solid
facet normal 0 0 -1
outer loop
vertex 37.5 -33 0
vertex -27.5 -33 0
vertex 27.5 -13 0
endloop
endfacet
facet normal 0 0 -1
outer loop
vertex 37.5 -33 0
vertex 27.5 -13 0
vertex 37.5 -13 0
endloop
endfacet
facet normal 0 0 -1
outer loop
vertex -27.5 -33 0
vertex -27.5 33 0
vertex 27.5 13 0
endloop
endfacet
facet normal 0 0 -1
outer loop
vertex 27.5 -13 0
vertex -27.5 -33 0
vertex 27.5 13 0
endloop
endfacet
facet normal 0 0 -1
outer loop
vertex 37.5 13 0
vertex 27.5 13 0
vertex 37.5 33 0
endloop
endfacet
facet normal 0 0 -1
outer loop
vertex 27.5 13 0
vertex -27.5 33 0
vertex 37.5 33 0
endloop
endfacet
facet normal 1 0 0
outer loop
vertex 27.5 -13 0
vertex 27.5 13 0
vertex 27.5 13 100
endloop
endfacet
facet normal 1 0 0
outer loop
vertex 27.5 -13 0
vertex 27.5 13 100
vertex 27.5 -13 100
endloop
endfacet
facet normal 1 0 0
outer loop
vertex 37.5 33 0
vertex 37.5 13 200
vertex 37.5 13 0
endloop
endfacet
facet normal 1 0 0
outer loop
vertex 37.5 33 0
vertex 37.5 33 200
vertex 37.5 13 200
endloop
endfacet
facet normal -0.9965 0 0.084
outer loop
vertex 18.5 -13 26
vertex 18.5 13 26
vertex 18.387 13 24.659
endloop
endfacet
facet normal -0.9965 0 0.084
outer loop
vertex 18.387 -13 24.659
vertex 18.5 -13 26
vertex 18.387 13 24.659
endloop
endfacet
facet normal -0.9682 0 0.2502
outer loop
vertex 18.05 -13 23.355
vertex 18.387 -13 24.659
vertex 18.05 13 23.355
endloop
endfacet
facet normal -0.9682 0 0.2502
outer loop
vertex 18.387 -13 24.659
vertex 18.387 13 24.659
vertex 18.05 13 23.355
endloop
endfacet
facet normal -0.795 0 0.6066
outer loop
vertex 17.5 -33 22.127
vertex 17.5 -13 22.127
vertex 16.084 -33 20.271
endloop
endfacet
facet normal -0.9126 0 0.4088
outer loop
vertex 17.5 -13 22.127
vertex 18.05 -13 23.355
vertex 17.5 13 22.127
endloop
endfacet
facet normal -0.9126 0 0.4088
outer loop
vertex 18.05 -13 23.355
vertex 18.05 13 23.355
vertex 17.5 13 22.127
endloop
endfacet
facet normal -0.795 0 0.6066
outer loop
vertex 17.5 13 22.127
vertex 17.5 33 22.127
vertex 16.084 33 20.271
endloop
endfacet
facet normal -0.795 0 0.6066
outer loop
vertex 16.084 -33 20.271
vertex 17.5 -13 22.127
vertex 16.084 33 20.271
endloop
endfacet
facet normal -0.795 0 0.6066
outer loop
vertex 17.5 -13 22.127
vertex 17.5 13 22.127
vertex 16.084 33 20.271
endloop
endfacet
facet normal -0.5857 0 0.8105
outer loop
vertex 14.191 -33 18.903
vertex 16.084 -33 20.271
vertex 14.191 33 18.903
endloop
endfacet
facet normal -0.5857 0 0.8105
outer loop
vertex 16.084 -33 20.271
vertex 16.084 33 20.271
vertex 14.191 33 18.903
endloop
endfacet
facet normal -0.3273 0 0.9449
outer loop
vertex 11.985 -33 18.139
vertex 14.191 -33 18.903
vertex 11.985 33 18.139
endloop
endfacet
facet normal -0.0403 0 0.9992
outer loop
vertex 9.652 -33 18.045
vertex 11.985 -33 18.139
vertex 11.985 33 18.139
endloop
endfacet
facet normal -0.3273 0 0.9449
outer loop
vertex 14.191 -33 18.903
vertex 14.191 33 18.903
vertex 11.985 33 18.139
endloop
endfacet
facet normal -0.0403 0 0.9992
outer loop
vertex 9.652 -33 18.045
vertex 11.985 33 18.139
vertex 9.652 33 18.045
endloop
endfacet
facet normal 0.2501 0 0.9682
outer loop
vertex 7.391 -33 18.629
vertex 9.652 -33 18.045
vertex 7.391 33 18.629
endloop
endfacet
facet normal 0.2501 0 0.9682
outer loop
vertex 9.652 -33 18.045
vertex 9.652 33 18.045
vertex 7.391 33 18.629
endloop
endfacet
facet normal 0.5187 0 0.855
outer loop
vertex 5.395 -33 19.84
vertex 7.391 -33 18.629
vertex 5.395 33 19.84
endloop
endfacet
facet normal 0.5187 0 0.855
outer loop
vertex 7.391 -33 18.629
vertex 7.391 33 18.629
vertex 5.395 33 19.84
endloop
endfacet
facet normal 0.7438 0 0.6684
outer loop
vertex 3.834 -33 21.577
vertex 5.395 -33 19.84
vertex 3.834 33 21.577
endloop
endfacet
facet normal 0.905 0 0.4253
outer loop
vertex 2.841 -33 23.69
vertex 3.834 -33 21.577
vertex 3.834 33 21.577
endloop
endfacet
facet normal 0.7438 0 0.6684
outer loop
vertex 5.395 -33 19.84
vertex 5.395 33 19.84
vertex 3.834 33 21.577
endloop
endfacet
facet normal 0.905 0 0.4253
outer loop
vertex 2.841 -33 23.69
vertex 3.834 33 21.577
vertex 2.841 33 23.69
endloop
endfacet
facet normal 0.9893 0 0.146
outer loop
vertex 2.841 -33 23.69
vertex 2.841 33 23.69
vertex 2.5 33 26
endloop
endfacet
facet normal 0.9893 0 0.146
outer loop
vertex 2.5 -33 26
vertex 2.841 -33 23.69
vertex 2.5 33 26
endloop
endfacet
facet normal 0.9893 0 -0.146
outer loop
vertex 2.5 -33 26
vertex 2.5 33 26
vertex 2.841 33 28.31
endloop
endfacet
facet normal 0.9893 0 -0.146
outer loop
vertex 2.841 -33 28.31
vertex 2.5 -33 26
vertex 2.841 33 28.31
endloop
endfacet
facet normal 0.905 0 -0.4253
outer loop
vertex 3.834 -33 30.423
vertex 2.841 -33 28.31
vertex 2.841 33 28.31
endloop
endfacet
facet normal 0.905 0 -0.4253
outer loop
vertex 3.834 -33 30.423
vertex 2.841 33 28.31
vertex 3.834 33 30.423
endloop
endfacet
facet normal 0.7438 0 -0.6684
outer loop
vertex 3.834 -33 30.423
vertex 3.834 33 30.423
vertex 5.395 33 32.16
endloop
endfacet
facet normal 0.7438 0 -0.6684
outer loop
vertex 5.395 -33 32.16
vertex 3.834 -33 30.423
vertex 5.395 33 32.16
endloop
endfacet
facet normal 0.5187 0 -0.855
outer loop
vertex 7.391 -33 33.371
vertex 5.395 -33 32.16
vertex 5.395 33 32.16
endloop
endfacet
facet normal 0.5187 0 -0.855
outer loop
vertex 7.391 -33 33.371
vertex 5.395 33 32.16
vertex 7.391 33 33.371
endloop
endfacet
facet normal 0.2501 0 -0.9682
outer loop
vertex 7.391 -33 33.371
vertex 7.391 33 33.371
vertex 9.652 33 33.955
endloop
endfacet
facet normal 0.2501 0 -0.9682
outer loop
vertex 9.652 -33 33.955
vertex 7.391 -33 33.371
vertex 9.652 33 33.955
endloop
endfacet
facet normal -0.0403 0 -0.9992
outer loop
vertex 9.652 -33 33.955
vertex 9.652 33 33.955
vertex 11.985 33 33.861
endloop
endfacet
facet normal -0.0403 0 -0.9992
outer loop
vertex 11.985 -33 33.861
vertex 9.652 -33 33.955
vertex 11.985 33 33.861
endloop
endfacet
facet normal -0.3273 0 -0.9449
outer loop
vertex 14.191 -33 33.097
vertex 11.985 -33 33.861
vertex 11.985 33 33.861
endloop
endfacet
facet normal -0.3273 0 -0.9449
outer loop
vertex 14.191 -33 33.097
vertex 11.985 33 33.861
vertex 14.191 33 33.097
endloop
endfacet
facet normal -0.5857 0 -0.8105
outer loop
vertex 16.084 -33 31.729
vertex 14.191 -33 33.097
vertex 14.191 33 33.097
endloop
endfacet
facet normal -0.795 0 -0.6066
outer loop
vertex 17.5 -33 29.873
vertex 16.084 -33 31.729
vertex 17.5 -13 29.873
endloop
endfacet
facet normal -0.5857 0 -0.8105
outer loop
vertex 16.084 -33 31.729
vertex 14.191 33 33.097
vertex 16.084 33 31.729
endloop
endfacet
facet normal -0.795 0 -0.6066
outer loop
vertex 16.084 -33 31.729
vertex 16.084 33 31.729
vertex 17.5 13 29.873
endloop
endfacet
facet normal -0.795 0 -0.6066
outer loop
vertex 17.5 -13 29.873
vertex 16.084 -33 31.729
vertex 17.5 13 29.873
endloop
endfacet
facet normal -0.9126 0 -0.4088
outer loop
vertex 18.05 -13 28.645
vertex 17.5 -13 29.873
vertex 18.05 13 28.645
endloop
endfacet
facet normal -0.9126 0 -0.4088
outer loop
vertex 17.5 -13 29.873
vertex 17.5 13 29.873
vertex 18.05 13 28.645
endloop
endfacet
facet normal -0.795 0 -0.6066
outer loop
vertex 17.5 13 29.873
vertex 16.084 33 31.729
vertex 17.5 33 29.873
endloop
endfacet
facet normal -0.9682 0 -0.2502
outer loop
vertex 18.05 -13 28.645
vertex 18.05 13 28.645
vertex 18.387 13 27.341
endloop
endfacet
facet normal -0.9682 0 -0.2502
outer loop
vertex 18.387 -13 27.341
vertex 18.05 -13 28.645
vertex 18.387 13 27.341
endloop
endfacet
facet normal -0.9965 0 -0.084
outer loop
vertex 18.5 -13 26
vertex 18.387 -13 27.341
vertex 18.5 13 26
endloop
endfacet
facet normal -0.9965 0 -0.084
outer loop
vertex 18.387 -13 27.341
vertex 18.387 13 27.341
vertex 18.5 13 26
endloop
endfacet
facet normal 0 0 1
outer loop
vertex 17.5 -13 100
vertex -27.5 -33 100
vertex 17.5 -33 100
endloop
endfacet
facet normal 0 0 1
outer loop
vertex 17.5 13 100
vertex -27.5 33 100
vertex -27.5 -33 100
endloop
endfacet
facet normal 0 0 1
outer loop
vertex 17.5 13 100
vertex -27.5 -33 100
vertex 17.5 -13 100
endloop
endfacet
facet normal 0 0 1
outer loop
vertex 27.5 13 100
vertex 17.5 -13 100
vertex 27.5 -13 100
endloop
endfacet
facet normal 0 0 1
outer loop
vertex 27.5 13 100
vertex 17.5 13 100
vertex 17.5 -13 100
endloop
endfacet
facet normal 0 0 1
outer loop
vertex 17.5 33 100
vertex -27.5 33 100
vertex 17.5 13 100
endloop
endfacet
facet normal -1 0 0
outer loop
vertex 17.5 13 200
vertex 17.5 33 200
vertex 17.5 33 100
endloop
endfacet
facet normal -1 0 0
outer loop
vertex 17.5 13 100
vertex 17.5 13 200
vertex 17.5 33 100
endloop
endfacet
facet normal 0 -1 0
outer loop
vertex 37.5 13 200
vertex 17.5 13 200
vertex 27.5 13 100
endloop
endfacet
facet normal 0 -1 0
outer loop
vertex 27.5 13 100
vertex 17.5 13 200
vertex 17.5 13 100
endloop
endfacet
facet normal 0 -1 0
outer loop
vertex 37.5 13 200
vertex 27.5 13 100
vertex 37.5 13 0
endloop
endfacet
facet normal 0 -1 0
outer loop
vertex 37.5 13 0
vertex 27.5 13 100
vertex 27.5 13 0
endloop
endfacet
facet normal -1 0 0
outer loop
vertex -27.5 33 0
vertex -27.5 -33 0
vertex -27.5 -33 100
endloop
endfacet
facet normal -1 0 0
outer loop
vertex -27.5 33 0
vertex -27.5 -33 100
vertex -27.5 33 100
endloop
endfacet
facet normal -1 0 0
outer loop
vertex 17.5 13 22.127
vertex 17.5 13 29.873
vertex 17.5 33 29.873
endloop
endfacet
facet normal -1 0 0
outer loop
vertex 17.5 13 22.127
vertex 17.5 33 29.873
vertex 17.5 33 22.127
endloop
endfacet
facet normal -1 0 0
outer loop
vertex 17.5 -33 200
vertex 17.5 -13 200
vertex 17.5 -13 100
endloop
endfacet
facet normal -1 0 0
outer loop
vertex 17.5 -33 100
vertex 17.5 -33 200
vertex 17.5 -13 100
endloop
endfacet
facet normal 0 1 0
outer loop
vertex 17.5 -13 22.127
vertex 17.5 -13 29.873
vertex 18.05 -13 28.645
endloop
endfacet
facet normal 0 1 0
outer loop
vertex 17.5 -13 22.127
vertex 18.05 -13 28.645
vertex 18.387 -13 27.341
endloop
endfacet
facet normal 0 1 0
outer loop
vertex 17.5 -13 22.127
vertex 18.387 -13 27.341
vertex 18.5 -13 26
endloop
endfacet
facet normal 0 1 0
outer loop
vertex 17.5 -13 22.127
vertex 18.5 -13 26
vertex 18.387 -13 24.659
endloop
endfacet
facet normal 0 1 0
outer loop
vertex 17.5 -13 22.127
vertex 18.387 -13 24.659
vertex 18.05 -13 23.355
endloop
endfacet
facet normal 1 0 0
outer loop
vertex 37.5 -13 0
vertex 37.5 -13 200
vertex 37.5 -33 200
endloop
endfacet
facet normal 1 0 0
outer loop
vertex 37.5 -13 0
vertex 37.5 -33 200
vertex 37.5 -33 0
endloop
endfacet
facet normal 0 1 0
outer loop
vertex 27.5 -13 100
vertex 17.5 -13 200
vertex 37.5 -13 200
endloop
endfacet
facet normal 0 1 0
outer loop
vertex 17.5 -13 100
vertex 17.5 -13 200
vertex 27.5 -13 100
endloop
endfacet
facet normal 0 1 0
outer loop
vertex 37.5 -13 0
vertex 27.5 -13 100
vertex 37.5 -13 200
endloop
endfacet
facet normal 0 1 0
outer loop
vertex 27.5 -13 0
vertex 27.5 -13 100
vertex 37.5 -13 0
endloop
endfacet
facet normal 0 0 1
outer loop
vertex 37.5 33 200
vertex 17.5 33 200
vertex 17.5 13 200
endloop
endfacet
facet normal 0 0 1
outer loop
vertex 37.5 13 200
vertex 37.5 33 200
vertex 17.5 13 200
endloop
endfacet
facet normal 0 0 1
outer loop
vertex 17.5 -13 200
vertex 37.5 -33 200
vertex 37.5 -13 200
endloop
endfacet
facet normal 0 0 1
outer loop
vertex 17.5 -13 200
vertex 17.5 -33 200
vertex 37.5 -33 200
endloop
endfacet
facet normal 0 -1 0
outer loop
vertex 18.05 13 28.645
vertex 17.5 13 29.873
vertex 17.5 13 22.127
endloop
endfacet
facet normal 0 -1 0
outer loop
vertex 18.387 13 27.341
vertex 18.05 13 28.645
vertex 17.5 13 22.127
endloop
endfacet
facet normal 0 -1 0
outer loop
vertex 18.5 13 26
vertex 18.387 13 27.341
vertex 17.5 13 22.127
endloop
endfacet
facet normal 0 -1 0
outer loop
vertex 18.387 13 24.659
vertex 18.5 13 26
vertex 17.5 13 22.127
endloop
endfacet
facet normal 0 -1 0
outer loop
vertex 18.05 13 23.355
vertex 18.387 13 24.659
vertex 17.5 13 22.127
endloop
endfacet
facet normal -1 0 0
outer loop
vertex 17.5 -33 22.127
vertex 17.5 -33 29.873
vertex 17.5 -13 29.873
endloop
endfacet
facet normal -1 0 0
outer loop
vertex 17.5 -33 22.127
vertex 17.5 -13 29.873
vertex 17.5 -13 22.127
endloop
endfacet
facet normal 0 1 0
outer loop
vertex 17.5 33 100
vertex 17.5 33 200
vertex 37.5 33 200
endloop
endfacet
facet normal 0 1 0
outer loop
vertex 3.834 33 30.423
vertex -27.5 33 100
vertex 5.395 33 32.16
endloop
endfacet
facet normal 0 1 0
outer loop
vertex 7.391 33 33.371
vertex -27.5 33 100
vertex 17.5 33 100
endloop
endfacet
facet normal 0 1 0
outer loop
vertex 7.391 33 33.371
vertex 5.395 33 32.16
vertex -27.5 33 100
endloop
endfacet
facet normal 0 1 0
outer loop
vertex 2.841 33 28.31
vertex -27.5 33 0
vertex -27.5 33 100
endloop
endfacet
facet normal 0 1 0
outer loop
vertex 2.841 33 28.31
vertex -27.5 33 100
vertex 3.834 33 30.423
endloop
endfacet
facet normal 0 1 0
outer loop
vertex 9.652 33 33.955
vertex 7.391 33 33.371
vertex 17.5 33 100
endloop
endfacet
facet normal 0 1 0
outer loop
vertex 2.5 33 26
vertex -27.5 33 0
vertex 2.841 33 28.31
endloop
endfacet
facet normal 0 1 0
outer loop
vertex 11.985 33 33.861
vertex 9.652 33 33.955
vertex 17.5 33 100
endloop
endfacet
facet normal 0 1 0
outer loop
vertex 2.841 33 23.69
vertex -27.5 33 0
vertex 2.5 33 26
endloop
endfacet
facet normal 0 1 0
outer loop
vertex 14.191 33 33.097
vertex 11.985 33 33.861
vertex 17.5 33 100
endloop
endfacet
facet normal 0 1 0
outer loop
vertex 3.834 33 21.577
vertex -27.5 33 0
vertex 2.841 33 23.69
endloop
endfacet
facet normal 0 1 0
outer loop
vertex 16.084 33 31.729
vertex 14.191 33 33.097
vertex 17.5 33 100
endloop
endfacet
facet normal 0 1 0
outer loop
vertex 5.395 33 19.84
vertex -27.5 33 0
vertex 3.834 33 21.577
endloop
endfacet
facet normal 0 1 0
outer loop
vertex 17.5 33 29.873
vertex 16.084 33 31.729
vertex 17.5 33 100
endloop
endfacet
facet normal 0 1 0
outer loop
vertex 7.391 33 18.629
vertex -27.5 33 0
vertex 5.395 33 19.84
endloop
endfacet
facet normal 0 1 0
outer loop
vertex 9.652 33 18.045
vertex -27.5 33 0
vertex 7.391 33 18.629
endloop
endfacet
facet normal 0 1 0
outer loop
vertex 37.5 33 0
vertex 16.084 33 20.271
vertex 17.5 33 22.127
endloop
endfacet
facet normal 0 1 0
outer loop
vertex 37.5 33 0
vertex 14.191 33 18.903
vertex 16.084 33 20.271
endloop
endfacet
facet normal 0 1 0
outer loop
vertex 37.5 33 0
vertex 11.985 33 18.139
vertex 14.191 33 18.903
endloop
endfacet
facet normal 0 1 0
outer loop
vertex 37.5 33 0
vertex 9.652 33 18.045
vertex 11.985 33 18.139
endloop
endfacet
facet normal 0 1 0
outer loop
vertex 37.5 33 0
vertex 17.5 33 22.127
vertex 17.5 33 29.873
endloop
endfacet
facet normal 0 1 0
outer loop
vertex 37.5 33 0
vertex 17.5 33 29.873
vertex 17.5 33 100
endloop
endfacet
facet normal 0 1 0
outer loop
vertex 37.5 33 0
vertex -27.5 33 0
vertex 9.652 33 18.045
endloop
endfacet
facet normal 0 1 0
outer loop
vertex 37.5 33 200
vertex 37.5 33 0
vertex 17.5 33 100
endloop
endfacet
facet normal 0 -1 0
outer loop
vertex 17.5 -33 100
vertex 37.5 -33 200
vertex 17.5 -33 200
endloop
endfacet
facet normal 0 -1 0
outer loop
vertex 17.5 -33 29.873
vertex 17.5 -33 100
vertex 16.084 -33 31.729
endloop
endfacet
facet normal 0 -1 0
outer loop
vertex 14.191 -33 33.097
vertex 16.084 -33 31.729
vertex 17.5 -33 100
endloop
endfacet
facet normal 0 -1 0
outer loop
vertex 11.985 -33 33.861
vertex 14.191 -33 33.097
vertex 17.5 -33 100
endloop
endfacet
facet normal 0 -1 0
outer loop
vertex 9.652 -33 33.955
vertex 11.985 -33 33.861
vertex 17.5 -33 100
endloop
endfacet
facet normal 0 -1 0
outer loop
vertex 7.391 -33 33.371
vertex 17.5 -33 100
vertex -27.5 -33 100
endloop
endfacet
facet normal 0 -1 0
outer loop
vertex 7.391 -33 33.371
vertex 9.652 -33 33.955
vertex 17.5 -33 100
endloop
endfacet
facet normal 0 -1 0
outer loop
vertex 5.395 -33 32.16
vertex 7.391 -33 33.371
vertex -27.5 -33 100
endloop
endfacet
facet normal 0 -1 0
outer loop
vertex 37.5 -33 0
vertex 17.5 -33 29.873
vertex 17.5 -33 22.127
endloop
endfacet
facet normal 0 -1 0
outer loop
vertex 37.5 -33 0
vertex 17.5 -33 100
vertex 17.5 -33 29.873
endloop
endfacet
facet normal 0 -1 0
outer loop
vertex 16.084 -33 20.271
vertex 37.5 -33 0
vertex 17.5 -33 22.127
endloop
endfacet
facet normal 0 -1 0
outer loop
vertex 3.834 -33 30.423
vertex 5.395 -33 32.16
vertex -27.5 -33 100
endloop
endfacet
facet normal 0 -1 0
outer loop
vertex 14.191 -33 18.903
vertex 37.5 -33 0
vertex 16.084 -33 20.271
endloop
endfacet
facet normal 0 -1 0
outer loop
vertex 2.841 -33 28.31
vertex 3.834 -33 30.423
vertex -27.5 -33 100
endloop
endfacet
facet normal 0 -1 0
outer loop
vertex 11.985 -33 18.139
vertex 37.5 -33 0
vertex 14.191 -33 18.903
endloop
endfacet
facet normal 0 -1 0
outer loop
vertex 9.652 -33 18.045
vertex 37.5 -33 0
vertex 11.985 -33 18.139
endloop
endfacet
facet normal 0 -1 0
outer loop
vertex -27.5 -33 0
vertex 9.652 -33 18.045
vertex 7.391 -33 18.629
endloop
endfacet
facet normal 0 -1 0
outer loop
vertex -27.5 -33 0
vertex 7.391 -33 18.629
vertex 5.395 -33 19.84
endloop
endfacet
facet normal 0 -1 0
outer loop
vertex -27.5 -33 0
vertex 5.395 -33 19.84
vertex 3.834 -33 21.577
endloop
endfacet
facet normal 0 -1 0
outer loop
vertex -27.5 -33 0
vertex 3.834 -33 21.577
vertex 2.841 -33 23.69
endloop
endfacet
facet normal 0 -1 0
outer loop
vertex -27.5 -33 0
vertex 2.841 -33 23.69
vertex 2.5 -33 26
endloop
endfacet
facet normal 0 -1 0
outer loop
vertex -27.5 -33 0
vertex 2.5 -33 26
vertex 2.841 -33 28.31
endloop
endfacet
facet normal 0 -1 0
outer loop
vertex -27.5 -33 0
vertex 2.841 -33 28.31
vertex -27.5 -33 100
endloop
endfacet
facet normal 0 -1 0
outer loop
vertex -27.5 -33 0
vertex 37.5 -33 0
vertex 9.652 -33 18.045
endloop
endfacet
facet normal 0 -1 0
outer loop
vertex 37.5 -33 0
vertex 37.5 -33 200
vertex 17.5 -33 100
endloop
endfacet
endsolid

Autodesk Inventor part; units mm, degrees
ref_plane "YZ Plane" through (0, 0, 0) normal (1, 0, 0) x (0, 1, 0)
ref_plane "XZ Plane" through (0, 0, 0) normal (0, 1, 0) x (-1, 0, 0)
ref_plane "XY Plane" through (0, 0, 0) normal (0, 0, 1) x (1, 0, 0)
sketch "Sketch1" plane through (0, 0, 0) normal (0, 0, 1) x (1, 0, 0)
  line L0 (27.5, -33) -> (-27.5, -33)
  line L1 (-27.5, -33) -> (-27.5, 33)
  line L2 (-27.5, 33) -> (27.5, 33)
  line L3 (27.5, 33) -> (27.5, -33)
  line L4 (0, 0) -> (0, 15.9599)
  line L5 (0, 0) -> (14.573, 0)
  point P0 (0, 33)
  point P1 (27.5, 0)
  dimension "d0" = 55
  dimension "d1" = 66
extrude "Extrusion1" add sketch "Sketch1" along normal blind 100
sketch "Sketch2" plane through (-27.5, 33, 0) normal (0, 1, 0) x (1, 0, 0)
  circle A0 centre (38, -26) radius 8 projected
  circle A1 centre (38, -26) radius 8
  point P0 (27.5, 0)
extrude "Extrusion2" cut sketch "Sketch2" against normal through all
sketch "Sketch3" plane through (27.5, -33, 0) normal (1, 0, 0) x (0, 0, -1)
  line L0 (0, 0) -> (-200, 0)
  line L1 (-200, 0) -> (-200, 20)
  line L2 (-200, 20) -> (0, 20)
  line L3 (0, 20) -> (0, 0)
  line L4 (0, 66) -> (-200, 66)
  line L5 (-200, 66) -> (-200, 46)
  line L6 (-200, 46) -> (0, 46)
  line L7 (0, 46) -> (0, 66)
  point P0 (0, 33)
  dimension "d6" = 200
  dimension "d7" = 20
  dimension "d8" = 200
  dimension "d9" = 20
extrude "Extrusion3" add sketch "Sketch3" along normal mid plane 20
properties part number "Support" material "Wood (Oak)"
